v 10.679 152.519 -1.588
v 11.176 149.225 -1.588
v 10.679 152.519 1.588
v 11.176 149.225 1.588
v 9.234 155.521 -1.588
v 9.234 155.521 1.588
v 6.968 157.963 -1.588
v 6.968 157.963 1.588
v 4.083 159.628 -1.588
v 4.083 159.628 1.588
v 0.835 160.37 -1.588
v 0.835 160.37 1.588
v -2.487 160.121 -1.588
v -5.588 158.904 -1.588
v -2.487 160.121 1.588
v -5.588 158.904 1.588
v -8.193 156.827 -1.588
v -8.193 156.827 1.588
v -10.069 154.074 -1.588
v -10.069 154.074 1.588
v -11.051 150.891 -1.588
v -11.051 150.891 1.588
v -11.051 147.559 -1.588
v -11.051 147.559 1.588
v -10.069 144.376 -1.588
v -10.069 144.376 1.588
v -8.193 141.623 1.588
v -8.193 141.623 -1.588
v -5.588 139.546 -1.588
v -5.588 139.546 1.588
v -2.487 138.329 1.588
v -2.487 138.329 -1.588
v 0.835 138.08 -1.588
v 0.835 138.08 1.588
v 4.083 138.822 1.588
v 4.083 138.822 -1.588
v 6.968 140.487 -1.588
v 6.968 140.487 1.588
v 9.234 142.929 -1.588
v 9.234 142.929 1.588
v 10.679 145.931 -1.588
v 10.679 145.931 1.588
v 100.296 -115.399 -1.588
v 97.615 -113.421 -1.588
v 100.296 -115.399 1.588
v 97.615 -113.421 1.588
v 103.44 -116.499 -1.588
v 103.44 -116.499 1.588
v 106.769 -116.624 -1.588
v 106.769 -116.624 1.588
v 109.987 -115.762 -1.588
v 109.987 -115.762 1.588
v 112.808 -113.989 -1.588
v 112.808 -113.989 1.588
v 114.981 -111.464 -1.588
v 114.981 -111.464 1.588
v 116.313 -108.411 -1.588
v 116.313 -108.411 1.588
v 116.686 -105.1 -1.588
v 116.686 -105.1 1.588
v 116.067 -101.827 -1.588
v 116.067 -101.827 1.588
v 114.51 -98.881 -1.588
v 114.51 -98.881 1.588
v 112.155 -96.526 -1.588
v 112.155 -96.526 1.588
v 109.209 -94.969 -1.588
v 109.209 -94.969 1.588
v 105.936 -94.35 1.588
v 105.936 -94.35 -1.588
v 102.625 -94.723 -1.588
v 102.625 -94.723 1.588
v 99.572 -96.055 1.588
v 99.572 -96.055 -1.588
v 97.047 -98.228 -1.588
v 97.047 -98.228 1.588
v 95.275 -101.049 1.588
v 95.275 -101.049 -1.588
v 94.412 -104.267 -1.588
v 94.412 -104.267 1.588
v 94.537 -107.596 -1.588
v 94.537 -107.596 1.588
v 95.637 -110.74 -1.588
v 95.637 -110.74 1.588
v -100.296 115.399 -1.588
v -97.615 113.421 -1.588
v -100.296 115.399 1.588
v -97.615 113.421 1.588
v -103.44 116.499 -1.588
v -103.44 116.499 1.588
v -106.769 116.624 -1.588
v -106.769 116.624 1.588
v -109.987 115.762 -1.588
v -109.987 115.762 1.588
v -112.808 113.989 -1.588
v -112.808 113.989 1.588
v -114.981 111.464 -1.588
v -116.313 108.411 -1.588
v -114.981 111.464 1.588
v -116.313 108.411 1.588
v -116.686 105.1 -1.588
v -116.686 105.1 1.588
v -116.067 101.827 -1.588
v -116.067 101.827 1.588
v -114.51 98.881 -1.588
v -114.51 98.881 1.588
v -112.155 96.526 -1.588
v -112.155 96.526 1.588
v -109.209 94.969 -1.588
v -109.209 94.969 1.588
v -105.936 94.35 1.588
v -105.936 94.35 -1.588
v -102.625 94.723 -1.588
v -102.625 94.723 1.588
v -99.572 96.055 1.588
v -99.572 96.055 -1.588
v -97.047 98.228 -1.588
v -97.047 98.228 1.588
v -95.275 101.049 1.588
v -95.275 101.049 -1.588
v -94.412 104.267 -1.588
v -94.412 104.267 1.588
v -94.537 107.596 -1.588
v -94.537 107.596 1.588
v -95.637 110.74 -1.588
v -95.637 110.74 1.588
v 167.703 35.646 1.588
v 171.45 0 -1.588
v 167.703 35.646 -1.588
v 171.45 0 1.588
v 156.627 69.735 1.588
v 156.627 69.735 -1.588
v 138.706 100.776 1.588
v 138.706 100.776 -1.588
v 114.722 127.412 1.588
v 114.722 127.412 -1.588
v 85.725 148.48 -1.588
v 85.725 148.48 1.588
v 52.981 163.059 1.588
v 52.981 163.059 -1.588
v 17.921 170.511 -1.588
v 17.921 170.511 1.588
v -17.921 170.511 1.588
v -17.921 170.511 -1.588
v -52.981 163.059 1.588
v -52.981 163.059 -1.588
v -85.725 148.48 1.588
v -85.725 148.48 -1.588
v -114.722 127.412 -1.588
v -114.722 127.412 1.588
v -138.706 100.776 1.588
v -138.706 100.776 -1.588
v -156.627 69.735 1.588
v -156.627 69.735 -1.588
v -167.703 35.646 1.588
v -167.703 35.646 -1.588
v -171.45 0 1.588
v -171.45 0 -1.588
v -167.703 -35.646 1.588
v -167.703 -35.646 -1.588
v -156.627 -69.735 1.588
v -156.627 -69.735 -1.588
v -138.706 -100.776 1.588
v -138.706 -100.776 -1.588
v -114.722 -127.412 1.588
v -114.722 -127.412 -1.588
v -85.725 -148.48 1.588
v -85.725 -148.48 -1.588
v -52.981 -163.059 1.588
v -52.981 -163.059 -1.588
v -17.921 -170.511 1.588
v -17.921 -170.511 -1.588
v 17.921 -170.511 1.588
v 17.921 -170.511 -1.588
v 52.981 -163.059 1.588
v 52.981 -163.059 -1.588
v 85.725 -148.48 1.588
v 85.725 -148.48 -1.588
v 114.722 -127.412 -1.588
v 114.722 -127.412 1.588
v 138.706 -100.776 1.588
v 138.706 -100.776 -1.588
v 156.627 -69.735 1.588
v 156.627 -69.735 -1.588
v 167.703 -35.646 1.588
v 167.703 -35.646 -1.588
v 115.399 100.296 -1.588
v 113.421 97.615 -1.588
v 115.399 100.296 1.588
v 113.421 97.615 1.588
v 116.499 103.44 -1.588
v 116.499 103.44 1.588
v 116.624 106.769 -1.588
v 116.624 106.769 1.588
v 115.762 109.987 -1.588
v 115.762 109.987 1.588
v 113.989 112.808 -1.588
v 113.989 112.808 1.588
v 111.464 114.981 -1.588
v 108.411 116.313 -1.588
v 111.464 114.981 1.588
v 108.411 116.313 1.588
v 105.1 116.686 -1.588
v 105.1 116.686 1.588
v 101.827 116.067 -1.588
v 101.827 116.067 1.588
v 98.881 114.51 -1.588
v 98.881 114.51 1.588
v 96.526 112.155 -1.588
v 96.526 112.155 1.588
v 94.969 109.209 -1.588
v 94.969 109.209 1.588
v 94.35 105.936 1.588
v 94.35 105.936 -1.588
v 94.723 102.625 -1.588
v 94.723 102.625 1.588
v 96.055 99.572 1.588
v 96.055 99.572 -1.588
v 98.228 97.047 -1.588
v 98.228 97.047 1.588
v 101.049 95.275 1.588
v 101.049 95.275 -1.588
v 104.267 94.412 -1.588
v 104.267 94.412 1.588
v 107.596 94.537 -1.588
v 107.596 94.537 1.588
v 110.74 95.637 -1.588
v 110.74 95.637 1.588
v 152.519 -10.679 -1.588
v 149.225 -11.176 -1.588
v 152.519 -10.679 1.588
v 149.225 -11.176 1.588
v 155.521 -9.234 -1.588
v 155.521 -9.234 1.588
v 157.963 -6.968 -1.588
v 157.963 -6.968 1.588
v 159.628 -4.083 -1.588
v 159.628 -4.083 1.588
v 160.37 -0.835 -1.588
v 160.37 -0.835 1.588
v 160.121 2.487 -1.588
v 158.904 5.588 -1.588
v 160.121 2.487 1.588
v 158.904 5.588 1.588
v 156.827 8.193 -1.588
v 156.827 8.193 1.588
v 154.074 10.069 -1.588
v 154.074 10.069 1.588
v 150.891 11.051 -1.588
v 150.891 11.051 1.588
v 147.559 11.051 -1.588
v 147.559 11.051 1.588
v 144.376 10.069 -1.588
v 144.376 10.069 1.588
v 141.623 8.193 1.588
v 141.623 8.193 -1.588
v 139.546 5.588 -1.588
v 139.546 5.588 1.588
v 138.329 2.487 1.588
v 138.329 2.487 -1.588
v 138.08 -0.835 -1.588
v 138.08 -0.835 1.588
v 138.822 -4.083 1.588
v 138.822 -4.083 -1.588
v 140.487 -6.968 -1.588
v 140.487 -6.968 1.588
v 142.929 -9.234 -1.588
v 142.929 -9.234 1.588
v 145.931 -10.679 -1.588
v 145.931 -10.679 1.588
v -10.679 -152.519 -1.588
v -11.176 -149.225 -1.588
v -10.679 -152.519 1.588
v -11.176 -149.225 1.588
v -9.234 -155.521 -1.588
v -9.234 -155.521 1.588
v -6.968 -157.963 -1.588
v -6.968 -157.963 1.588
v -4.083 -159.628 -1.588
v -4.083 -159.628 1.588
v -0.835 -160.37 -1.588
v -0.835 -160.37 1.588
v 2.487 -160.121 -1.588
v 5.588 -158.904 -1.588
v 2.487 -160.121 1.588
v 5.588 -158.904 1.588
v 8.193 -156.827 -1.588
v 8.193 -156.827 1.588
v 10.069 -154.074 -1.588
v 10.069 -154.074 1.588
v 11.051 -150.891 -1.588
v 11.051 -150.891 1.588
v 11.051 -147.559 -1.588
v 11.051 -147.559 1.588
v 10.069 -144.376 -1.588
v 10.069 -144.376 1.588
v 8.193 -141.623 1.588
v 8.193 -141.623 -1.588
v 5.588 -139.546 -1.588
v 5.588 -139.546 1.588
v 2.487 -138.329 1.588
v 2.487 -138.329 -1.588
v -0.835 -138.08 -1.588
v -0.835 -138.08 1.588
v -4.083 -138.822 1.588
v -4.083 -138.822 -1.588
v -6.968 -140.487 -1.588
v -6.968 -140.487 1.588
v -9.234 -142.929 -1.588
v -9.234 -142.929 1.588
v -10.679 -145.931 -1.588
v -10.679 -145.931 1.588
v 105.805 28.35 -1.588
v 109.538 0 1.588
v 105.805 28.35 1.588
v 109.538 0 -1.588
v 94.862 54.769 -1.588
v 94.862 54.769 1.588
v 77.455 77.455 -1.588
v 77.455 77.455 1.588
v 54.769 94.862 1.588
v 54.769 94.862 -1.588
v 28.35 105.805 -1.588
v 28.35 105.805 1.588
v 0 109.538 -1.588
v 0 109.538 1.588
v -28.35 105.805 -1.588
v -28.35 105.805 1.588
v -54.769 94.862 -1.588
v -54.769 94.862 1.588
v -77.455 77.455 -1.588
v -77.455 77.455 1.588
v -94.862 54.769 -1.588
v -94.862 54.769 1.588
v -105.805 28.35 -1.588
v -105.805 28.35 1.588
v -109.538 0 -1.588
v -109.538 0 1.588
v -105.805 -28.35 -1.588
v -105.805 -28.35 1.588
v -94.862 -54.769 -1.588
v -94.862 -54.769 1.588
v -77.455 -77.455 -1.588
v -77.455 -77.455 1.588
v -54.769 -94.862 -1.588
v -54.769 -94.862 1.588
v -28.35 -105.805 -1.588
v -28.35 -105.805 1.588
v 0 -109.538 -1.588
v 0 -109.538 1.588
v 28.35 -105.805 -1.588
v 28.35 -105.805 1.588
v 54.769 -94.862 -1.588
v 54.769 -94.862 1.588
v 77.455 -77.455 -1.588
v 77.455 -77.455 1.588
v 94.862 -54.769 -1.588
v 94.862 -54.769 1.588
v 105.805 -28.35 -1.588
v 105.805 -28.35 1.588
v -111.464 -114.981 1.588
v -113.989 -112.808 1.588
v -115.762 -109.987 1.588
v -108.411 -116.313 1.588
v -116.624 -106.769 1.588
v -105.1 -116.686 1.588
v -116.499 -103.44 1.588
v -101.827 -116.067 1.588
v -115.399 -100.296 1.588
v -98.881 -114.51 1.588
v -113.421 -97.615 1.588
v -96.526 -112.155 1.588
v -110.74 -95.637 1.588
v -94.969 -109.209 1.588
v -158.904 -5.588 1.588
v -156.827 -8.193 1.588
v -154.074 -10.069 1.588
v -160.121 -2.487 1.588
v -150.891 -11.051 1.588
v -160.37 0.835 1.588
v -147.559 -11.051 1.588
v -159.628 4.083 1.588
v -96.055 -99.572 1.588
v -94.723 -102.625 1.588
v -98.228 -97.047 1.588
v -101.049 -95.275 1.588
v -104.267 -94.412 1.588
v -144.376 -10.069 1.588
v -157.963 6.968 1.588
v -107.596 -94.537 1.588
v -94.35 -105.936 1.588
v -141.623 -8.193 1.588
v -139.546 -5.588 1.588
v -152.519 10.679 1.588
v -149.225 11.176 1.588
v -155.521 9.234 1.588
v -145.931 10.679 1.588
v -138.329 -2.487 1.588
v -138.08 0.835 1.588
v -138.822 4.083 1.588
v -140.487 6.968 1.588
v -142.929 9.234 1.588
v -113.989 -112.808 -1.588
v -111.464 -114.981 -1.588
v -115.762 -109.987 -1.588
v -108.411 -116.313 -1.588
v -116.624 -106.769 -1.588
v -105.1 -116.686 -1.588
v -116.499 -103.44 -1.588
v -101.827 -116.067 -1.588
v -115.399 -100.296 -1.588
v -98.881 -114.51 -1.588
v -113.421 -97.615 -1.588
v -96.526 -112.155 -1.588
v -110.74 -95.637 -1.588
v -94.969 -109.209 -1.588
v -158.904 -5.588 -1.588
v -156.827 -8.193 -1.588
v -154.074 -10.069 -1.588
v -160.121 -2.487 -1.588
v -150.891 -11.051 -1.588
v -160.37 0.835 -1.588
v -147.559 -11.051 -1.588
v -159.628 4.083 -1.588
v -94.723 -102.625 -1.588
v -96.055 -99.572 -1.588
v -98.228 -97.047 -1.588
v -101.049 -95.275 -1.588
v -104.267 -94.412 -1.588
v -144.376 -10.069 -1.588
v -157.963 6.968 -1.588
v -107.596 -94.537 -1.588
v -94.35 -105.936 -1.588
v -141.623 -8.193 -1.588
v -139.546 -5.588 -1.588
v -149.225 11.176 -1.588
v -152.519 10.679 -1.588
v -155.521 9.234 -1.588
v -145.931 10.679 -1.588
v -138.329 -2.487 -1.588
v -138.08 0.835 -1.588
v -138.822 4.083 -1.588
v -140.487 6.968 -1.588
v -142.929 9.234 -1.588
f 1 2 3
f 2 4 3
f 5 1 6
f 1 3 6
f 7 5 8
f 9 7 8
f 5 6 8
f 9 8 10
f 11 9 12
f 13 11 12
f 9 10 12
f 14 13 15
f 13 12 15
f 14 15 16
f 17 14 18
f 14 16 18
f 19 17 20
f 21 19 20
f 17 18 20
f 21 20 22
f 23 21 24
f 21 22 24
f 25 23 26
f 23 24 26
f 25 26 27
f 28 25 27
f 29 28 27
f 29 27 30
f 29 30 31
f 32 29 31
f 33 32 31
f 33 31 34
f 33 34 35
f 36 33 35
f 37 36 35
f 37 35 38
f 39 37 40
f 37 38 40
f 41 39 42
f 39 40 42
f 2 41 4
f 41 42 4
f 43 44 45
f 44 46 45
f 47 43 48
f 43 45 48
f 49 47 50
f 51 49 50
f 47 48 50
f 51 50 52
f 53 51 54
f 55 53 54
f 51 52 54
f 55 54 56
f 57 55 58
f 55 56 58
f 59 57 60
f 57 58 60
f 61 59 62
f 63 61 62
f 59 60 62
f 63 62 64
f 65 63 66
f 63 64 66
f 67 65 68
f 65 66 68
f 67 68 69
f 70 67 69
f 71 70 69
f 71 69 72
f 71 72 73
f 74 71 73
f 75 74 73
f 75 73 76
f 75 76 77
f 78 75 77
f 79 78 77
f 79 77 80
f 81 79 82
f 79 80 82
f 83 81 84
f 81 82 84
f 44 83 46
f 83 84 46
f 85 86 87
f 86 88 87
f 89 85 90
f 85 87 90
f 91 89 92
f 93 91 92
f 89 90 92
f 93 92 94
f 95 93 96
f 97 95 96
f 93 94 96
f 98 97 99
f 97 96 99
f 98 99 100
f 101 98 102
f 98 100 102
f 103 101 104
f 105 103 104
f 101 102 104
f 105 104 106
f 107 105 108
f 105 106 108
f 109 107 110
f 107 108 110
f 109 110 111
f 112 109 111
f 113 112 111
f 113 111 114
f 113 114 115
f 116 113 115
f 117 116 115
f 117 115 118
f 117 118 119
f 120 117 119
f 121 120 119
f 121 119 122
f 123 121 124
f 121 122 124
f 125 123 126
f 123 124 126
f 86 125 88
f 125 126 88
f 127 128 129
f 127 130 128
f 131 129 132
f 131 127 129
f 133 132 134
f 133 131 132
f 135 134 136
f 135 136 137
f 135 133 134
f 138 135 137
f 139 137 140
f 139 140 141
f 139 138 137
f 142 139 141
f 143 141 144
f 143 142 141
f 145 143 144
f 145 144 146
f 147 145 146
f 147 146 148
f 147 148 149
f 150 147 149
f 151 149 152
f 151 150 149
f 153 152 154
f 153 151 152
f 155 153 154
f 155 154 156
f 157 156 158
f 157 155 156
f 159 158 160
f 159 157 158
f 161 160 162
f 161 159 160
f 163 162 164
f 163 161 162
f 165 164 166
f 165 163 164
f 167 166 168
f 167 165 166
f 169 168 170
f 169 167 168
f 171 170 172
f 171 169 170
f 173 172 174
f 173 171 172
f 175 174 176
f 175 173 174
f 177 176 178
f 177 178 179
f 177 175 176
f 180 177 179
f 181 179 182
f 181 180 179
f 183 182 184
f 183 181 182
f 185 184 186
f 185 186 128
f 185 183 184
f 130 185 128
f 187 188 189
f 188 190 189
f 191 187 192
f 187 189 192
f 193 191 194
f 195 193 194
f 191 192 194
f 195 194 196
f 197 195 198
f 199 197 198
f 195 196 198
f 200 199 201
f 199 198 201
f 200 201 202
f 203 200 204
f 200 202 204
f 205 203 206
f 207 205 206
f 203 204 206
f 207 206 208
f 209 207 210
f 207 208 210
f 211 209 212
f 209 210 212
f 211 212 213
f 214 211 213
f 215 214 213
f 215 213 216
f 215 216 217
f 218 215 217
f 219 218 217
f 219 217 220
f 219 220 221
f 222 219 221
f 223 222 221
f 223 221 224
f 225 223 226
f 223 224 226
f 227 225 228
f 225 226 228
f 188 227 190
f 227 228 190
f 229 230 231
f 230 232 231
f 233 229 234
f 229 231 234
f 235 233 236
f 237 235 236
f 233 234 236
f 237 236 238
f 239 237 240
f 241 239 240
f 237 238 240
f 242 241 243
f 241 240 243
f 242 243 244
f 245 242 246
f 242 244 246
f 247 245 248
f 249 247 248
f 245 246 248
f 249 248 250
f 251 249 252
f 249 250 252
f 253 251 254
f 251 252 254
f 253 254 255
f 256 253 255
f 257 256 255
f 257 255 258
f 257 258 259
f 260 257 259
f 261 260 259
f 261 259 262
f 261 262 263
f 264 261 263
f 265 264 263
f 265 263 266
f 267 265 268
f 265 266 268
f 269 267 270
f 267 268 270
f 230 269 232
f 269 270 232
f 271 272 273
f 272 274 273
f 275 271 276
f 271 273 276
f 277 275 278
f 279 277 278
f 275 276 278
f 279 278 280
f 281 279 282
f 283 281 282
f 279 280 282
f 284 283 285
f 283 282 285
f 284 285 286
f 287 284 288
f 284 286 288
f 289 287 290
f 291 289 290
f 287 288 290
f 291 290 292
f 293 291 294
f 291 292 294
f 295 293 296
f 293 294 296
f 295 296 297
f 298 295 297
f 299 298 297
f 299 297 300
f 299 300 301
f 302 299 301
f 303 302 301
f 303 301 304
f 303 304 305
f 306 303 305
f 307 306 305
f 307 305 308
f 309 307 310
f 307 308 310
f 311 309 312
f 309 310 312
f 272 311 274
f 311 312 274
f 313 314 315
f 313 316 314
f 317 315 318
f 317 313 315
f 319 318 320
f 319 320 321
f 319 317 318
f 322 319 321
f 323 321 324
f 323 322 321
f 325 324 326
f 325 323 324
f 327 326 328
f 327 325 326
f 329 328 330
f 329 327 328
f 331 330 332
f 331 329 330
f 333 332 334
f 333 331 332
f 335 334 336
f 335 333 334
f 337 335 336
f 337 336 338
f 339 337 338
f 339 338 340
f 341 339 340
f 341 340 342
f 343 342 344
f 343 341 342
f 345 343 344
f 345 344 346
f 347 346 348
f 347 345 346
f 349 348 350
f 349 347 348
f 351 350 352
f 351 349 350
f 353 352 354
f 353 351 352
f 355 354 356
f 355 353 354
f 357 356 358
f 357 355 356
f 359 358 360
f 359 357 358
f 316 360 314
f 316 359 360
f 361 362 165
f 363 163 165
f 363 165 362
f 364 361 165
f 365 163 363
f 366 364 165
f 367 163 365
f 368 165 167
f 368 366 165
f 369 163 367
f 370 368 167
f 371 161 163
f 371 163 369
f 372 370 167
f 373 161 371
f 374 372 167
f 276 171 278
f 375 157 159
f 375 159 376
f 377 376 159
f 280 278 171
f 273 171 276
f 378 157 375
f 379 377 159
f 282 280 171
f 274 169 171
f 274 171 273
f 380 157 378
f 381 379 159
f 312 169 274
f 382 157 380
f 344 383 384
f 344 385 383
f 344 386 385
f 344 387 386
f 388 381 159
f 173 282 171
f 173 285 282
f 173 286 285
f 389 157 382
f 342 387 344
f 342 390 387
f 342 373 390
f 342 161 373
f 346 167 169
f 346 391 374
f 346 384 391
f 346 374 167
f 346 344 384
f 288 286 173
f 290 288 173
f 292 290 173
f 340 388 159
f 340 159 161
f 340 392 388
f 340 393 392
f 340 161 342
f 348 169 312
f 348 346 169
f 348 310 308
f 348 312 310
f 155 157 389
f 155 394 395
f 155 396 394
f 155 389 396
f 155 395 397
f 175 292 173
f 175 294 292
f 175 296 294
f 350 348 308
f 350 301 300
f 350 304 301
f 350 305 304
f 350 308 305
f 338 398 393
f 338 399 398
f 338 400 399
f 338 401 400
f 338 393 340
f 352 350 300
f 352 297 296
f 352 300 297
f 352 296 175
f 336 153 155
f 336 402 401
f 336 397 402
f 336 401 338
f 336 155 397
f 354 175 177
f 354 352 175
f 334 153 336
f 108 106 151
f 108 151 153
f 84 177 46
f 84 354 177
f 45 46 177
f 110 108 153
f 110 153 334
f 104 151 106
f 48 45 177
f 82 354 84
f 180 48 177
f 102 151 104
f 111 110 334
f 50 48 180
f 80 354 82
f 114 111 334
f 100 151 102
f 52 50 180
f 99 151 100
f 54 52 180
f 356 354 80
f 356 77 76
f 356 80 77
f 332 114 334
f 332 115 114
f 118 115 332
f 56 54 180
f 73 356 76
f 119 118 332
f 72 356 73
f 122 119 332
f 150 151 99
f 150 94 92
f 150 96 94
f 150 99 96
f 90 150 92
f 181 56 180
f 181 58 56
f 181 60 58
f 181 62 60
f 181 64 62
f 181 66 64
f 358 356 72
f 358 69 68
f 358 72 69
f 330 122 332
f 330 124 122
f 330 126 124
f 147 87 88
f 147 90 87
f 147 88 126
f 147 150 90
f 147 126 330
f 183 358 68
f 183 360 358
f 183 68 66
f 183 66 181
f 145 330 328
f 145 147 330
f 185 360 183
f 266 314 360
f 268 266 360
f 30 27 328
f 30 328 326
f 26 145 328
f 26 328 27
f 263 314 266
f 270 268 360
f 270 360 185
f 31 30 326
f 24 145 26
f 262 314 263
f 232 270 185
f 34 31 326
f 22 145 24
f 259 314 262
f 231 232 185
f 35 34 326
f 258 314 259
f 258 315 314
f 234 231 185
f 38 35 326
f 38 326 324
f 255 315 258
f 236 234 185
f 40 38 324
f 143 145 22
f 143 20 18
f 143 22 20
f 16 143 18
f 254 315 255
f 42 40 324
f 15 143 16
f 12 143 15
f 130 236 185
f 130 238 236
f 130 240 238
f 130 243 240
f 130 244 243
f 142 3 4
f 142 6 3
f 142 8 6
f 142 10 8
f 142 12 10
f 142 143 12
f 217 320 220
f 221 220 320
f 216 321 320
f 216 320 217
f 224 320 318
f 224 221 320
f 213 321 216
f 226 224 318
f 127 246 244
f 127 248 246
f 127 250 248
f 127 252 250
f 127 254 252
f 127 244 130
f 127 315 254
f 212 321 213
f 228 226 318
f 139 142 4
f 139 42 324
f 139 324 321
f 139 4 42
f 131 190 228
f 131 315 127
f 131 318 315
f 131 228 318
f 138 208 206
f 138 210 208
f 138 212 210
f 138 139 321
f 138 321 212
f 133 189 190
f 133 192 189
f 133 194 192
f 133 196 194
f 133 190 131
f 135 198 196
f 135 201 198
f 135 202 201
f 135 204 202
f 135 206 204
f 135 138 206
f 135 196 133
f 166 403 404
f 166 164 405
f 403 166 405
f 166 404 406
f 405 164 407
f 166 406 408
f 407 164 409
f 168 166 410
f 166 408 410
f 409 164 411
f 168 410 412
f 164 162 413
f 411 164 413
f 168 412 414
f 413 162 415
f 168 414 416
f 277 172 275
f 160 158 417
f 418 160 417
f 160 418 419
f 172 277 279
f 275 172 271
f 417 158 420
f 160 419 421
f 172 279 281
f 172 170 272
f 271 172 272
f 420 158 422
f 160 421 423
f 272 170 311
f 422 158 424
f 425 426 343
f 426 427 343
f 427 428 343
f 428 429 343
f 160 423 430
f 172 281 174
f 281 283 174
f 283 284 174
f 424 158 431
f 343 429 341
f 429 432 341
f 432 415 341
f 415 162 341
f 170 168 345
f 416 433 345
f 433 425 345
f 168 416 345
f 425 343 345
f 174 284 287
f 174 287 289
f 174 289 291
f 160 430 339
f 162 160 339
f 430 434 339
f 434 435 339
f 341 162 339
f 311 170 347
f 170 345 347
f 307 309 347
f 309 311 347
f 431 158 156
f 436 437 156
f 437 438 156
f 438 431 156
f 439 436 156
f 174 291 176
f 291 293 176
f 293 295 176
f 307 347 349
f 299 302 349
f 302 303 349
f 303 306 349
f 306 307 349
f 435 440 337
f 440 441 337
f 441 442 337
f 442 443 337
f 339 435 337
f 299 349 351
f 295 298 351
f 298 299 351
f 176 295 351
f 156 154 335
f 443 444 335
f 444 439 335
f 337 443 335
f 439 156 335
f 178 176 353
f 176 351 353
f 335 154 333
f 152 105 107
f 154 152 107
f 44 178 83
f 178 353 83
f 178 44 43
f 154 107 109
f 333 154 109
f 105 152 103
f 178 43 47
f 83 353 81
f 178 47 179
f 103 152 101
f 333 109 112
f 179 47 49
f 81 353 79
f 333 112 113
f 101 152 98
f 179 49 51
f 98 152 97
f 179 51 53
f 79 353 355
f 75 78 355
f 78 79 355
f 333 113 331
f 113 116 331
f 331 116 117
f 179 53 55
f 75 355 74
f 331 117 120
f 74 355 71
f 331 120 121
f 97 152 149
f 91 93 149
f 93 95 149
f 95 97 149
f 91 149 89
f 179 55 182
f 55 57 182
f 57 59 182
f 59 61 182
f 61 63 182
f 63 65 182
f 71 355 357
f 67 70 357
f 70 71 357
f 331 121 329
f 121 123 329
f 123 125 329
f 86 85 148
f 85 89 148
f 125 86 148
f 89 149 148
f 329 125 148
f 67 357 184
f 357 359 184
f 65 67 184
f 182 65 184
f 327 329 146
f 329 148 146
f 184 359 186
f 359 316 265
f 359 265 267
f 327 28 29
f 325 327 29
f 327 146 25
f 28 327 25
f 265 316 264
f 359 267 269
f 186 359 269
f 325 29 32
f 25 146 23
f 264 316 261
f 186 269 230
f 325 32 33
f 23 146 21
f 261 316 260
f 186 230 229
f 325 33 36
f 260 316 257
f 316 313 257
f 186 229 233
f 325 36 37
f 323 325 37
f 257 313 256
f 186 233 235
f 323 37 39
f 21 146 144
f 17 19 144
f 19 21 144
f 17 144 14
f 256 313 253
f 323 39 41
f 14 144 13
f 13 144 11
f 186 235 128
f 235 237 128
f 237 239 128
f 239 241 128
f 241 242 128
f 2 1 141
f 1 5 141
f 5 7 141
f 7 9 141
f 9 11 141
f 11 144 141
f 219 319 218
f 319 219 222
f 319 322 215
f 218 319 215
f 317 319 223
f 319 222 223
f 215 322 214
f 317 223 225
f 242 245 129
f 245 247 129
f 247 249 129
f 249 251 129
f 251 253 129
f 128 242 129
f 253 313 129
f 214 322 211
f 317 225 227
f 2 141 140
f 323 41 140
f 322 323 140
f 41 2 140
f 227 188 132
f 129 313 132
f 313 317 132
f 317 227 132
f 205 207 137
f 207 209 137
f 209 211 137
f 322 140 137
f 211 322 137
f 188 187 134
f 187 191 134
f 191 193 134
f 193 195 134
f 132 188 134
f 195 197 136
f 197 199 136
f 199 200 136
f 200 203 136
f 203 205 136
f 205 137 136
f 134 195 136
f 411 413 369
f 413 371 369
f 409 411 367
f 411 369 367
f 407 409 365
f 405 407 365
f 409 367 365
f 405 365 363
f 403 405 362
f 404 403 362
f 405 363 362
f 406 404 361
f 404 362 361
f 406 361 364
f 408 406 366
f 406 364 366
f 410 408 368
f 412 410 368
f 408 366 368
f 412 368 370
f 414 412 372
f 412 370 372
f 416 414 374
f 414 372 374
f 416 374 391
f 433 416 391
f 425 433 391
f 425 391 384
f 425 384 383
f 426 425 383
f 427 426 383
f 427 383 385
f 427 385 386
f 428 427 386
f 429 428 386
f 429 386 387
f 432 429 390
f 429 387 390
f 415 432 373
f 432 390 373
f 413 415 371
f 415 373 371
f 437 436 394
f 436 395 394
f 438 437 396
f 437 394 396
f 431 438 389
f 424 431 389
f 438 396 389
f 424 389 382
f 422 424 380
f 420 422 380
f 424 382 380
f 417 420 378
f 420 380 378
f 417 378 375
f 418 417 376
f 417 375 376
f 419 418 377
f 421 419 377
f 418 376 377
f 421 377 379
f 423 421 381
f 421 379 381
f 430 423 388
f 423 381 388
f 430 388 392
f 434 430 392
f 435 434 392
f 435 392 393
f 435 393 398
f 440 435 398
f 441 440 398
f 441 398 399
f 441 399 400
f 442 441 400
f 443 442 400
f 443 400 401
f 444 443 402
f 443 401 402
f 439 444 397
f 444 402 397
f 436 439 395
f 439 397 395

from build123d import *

# Parameters (mm, degrees)
SKETCH1_R           = 171.45
SKETCH1_R_2         = 109.5375
BOSS_EXTRUDE1_DEPTH = 1.5875
SKETCH2_R           = 11.176
CUT_EXTRUDE1_DEPTH  = 243.472112121
CIRPATTERN1_COUNT   = 8


with BuildPart() as part:
    # Sketch1 → Boss-Extrude1 (new, symmetric)
    with BuildSketch(Plane.XY):
        Circle(SKETCH1_R)
        Circle(SKETCH1_R_2, mode=Mode.SUBTRACT)
    extrude(amount=BOSS_EXTRUDE1_DEPTH, both=True)

    # Sketch2 → Cut-Extrude1 (cut, symmetric)
    with BuildSketch(Plane.XY):
        with Locations((0, 149.225)):
            Circle(SKETCH2_R)
    cut_extrude1 = extrude(amount=CUT_EXTRUDE1_DEPTH, both=True, mode=Mode.SUBTRACT)

    # CirPattern1: Cut-Extrude1 ×8 about axis
    cirpattern1_axis = Axis((0, 0, 0), (0, 0, 1))
    for i in range(1, CIRPATTERN1_COUNT):
        add(cut_extrude1.rotate(cirpattern1_axis, i * 360 / CIRPATTERN1_COUNT), mode=Mode.SUBTRACT)


solid = part.part
